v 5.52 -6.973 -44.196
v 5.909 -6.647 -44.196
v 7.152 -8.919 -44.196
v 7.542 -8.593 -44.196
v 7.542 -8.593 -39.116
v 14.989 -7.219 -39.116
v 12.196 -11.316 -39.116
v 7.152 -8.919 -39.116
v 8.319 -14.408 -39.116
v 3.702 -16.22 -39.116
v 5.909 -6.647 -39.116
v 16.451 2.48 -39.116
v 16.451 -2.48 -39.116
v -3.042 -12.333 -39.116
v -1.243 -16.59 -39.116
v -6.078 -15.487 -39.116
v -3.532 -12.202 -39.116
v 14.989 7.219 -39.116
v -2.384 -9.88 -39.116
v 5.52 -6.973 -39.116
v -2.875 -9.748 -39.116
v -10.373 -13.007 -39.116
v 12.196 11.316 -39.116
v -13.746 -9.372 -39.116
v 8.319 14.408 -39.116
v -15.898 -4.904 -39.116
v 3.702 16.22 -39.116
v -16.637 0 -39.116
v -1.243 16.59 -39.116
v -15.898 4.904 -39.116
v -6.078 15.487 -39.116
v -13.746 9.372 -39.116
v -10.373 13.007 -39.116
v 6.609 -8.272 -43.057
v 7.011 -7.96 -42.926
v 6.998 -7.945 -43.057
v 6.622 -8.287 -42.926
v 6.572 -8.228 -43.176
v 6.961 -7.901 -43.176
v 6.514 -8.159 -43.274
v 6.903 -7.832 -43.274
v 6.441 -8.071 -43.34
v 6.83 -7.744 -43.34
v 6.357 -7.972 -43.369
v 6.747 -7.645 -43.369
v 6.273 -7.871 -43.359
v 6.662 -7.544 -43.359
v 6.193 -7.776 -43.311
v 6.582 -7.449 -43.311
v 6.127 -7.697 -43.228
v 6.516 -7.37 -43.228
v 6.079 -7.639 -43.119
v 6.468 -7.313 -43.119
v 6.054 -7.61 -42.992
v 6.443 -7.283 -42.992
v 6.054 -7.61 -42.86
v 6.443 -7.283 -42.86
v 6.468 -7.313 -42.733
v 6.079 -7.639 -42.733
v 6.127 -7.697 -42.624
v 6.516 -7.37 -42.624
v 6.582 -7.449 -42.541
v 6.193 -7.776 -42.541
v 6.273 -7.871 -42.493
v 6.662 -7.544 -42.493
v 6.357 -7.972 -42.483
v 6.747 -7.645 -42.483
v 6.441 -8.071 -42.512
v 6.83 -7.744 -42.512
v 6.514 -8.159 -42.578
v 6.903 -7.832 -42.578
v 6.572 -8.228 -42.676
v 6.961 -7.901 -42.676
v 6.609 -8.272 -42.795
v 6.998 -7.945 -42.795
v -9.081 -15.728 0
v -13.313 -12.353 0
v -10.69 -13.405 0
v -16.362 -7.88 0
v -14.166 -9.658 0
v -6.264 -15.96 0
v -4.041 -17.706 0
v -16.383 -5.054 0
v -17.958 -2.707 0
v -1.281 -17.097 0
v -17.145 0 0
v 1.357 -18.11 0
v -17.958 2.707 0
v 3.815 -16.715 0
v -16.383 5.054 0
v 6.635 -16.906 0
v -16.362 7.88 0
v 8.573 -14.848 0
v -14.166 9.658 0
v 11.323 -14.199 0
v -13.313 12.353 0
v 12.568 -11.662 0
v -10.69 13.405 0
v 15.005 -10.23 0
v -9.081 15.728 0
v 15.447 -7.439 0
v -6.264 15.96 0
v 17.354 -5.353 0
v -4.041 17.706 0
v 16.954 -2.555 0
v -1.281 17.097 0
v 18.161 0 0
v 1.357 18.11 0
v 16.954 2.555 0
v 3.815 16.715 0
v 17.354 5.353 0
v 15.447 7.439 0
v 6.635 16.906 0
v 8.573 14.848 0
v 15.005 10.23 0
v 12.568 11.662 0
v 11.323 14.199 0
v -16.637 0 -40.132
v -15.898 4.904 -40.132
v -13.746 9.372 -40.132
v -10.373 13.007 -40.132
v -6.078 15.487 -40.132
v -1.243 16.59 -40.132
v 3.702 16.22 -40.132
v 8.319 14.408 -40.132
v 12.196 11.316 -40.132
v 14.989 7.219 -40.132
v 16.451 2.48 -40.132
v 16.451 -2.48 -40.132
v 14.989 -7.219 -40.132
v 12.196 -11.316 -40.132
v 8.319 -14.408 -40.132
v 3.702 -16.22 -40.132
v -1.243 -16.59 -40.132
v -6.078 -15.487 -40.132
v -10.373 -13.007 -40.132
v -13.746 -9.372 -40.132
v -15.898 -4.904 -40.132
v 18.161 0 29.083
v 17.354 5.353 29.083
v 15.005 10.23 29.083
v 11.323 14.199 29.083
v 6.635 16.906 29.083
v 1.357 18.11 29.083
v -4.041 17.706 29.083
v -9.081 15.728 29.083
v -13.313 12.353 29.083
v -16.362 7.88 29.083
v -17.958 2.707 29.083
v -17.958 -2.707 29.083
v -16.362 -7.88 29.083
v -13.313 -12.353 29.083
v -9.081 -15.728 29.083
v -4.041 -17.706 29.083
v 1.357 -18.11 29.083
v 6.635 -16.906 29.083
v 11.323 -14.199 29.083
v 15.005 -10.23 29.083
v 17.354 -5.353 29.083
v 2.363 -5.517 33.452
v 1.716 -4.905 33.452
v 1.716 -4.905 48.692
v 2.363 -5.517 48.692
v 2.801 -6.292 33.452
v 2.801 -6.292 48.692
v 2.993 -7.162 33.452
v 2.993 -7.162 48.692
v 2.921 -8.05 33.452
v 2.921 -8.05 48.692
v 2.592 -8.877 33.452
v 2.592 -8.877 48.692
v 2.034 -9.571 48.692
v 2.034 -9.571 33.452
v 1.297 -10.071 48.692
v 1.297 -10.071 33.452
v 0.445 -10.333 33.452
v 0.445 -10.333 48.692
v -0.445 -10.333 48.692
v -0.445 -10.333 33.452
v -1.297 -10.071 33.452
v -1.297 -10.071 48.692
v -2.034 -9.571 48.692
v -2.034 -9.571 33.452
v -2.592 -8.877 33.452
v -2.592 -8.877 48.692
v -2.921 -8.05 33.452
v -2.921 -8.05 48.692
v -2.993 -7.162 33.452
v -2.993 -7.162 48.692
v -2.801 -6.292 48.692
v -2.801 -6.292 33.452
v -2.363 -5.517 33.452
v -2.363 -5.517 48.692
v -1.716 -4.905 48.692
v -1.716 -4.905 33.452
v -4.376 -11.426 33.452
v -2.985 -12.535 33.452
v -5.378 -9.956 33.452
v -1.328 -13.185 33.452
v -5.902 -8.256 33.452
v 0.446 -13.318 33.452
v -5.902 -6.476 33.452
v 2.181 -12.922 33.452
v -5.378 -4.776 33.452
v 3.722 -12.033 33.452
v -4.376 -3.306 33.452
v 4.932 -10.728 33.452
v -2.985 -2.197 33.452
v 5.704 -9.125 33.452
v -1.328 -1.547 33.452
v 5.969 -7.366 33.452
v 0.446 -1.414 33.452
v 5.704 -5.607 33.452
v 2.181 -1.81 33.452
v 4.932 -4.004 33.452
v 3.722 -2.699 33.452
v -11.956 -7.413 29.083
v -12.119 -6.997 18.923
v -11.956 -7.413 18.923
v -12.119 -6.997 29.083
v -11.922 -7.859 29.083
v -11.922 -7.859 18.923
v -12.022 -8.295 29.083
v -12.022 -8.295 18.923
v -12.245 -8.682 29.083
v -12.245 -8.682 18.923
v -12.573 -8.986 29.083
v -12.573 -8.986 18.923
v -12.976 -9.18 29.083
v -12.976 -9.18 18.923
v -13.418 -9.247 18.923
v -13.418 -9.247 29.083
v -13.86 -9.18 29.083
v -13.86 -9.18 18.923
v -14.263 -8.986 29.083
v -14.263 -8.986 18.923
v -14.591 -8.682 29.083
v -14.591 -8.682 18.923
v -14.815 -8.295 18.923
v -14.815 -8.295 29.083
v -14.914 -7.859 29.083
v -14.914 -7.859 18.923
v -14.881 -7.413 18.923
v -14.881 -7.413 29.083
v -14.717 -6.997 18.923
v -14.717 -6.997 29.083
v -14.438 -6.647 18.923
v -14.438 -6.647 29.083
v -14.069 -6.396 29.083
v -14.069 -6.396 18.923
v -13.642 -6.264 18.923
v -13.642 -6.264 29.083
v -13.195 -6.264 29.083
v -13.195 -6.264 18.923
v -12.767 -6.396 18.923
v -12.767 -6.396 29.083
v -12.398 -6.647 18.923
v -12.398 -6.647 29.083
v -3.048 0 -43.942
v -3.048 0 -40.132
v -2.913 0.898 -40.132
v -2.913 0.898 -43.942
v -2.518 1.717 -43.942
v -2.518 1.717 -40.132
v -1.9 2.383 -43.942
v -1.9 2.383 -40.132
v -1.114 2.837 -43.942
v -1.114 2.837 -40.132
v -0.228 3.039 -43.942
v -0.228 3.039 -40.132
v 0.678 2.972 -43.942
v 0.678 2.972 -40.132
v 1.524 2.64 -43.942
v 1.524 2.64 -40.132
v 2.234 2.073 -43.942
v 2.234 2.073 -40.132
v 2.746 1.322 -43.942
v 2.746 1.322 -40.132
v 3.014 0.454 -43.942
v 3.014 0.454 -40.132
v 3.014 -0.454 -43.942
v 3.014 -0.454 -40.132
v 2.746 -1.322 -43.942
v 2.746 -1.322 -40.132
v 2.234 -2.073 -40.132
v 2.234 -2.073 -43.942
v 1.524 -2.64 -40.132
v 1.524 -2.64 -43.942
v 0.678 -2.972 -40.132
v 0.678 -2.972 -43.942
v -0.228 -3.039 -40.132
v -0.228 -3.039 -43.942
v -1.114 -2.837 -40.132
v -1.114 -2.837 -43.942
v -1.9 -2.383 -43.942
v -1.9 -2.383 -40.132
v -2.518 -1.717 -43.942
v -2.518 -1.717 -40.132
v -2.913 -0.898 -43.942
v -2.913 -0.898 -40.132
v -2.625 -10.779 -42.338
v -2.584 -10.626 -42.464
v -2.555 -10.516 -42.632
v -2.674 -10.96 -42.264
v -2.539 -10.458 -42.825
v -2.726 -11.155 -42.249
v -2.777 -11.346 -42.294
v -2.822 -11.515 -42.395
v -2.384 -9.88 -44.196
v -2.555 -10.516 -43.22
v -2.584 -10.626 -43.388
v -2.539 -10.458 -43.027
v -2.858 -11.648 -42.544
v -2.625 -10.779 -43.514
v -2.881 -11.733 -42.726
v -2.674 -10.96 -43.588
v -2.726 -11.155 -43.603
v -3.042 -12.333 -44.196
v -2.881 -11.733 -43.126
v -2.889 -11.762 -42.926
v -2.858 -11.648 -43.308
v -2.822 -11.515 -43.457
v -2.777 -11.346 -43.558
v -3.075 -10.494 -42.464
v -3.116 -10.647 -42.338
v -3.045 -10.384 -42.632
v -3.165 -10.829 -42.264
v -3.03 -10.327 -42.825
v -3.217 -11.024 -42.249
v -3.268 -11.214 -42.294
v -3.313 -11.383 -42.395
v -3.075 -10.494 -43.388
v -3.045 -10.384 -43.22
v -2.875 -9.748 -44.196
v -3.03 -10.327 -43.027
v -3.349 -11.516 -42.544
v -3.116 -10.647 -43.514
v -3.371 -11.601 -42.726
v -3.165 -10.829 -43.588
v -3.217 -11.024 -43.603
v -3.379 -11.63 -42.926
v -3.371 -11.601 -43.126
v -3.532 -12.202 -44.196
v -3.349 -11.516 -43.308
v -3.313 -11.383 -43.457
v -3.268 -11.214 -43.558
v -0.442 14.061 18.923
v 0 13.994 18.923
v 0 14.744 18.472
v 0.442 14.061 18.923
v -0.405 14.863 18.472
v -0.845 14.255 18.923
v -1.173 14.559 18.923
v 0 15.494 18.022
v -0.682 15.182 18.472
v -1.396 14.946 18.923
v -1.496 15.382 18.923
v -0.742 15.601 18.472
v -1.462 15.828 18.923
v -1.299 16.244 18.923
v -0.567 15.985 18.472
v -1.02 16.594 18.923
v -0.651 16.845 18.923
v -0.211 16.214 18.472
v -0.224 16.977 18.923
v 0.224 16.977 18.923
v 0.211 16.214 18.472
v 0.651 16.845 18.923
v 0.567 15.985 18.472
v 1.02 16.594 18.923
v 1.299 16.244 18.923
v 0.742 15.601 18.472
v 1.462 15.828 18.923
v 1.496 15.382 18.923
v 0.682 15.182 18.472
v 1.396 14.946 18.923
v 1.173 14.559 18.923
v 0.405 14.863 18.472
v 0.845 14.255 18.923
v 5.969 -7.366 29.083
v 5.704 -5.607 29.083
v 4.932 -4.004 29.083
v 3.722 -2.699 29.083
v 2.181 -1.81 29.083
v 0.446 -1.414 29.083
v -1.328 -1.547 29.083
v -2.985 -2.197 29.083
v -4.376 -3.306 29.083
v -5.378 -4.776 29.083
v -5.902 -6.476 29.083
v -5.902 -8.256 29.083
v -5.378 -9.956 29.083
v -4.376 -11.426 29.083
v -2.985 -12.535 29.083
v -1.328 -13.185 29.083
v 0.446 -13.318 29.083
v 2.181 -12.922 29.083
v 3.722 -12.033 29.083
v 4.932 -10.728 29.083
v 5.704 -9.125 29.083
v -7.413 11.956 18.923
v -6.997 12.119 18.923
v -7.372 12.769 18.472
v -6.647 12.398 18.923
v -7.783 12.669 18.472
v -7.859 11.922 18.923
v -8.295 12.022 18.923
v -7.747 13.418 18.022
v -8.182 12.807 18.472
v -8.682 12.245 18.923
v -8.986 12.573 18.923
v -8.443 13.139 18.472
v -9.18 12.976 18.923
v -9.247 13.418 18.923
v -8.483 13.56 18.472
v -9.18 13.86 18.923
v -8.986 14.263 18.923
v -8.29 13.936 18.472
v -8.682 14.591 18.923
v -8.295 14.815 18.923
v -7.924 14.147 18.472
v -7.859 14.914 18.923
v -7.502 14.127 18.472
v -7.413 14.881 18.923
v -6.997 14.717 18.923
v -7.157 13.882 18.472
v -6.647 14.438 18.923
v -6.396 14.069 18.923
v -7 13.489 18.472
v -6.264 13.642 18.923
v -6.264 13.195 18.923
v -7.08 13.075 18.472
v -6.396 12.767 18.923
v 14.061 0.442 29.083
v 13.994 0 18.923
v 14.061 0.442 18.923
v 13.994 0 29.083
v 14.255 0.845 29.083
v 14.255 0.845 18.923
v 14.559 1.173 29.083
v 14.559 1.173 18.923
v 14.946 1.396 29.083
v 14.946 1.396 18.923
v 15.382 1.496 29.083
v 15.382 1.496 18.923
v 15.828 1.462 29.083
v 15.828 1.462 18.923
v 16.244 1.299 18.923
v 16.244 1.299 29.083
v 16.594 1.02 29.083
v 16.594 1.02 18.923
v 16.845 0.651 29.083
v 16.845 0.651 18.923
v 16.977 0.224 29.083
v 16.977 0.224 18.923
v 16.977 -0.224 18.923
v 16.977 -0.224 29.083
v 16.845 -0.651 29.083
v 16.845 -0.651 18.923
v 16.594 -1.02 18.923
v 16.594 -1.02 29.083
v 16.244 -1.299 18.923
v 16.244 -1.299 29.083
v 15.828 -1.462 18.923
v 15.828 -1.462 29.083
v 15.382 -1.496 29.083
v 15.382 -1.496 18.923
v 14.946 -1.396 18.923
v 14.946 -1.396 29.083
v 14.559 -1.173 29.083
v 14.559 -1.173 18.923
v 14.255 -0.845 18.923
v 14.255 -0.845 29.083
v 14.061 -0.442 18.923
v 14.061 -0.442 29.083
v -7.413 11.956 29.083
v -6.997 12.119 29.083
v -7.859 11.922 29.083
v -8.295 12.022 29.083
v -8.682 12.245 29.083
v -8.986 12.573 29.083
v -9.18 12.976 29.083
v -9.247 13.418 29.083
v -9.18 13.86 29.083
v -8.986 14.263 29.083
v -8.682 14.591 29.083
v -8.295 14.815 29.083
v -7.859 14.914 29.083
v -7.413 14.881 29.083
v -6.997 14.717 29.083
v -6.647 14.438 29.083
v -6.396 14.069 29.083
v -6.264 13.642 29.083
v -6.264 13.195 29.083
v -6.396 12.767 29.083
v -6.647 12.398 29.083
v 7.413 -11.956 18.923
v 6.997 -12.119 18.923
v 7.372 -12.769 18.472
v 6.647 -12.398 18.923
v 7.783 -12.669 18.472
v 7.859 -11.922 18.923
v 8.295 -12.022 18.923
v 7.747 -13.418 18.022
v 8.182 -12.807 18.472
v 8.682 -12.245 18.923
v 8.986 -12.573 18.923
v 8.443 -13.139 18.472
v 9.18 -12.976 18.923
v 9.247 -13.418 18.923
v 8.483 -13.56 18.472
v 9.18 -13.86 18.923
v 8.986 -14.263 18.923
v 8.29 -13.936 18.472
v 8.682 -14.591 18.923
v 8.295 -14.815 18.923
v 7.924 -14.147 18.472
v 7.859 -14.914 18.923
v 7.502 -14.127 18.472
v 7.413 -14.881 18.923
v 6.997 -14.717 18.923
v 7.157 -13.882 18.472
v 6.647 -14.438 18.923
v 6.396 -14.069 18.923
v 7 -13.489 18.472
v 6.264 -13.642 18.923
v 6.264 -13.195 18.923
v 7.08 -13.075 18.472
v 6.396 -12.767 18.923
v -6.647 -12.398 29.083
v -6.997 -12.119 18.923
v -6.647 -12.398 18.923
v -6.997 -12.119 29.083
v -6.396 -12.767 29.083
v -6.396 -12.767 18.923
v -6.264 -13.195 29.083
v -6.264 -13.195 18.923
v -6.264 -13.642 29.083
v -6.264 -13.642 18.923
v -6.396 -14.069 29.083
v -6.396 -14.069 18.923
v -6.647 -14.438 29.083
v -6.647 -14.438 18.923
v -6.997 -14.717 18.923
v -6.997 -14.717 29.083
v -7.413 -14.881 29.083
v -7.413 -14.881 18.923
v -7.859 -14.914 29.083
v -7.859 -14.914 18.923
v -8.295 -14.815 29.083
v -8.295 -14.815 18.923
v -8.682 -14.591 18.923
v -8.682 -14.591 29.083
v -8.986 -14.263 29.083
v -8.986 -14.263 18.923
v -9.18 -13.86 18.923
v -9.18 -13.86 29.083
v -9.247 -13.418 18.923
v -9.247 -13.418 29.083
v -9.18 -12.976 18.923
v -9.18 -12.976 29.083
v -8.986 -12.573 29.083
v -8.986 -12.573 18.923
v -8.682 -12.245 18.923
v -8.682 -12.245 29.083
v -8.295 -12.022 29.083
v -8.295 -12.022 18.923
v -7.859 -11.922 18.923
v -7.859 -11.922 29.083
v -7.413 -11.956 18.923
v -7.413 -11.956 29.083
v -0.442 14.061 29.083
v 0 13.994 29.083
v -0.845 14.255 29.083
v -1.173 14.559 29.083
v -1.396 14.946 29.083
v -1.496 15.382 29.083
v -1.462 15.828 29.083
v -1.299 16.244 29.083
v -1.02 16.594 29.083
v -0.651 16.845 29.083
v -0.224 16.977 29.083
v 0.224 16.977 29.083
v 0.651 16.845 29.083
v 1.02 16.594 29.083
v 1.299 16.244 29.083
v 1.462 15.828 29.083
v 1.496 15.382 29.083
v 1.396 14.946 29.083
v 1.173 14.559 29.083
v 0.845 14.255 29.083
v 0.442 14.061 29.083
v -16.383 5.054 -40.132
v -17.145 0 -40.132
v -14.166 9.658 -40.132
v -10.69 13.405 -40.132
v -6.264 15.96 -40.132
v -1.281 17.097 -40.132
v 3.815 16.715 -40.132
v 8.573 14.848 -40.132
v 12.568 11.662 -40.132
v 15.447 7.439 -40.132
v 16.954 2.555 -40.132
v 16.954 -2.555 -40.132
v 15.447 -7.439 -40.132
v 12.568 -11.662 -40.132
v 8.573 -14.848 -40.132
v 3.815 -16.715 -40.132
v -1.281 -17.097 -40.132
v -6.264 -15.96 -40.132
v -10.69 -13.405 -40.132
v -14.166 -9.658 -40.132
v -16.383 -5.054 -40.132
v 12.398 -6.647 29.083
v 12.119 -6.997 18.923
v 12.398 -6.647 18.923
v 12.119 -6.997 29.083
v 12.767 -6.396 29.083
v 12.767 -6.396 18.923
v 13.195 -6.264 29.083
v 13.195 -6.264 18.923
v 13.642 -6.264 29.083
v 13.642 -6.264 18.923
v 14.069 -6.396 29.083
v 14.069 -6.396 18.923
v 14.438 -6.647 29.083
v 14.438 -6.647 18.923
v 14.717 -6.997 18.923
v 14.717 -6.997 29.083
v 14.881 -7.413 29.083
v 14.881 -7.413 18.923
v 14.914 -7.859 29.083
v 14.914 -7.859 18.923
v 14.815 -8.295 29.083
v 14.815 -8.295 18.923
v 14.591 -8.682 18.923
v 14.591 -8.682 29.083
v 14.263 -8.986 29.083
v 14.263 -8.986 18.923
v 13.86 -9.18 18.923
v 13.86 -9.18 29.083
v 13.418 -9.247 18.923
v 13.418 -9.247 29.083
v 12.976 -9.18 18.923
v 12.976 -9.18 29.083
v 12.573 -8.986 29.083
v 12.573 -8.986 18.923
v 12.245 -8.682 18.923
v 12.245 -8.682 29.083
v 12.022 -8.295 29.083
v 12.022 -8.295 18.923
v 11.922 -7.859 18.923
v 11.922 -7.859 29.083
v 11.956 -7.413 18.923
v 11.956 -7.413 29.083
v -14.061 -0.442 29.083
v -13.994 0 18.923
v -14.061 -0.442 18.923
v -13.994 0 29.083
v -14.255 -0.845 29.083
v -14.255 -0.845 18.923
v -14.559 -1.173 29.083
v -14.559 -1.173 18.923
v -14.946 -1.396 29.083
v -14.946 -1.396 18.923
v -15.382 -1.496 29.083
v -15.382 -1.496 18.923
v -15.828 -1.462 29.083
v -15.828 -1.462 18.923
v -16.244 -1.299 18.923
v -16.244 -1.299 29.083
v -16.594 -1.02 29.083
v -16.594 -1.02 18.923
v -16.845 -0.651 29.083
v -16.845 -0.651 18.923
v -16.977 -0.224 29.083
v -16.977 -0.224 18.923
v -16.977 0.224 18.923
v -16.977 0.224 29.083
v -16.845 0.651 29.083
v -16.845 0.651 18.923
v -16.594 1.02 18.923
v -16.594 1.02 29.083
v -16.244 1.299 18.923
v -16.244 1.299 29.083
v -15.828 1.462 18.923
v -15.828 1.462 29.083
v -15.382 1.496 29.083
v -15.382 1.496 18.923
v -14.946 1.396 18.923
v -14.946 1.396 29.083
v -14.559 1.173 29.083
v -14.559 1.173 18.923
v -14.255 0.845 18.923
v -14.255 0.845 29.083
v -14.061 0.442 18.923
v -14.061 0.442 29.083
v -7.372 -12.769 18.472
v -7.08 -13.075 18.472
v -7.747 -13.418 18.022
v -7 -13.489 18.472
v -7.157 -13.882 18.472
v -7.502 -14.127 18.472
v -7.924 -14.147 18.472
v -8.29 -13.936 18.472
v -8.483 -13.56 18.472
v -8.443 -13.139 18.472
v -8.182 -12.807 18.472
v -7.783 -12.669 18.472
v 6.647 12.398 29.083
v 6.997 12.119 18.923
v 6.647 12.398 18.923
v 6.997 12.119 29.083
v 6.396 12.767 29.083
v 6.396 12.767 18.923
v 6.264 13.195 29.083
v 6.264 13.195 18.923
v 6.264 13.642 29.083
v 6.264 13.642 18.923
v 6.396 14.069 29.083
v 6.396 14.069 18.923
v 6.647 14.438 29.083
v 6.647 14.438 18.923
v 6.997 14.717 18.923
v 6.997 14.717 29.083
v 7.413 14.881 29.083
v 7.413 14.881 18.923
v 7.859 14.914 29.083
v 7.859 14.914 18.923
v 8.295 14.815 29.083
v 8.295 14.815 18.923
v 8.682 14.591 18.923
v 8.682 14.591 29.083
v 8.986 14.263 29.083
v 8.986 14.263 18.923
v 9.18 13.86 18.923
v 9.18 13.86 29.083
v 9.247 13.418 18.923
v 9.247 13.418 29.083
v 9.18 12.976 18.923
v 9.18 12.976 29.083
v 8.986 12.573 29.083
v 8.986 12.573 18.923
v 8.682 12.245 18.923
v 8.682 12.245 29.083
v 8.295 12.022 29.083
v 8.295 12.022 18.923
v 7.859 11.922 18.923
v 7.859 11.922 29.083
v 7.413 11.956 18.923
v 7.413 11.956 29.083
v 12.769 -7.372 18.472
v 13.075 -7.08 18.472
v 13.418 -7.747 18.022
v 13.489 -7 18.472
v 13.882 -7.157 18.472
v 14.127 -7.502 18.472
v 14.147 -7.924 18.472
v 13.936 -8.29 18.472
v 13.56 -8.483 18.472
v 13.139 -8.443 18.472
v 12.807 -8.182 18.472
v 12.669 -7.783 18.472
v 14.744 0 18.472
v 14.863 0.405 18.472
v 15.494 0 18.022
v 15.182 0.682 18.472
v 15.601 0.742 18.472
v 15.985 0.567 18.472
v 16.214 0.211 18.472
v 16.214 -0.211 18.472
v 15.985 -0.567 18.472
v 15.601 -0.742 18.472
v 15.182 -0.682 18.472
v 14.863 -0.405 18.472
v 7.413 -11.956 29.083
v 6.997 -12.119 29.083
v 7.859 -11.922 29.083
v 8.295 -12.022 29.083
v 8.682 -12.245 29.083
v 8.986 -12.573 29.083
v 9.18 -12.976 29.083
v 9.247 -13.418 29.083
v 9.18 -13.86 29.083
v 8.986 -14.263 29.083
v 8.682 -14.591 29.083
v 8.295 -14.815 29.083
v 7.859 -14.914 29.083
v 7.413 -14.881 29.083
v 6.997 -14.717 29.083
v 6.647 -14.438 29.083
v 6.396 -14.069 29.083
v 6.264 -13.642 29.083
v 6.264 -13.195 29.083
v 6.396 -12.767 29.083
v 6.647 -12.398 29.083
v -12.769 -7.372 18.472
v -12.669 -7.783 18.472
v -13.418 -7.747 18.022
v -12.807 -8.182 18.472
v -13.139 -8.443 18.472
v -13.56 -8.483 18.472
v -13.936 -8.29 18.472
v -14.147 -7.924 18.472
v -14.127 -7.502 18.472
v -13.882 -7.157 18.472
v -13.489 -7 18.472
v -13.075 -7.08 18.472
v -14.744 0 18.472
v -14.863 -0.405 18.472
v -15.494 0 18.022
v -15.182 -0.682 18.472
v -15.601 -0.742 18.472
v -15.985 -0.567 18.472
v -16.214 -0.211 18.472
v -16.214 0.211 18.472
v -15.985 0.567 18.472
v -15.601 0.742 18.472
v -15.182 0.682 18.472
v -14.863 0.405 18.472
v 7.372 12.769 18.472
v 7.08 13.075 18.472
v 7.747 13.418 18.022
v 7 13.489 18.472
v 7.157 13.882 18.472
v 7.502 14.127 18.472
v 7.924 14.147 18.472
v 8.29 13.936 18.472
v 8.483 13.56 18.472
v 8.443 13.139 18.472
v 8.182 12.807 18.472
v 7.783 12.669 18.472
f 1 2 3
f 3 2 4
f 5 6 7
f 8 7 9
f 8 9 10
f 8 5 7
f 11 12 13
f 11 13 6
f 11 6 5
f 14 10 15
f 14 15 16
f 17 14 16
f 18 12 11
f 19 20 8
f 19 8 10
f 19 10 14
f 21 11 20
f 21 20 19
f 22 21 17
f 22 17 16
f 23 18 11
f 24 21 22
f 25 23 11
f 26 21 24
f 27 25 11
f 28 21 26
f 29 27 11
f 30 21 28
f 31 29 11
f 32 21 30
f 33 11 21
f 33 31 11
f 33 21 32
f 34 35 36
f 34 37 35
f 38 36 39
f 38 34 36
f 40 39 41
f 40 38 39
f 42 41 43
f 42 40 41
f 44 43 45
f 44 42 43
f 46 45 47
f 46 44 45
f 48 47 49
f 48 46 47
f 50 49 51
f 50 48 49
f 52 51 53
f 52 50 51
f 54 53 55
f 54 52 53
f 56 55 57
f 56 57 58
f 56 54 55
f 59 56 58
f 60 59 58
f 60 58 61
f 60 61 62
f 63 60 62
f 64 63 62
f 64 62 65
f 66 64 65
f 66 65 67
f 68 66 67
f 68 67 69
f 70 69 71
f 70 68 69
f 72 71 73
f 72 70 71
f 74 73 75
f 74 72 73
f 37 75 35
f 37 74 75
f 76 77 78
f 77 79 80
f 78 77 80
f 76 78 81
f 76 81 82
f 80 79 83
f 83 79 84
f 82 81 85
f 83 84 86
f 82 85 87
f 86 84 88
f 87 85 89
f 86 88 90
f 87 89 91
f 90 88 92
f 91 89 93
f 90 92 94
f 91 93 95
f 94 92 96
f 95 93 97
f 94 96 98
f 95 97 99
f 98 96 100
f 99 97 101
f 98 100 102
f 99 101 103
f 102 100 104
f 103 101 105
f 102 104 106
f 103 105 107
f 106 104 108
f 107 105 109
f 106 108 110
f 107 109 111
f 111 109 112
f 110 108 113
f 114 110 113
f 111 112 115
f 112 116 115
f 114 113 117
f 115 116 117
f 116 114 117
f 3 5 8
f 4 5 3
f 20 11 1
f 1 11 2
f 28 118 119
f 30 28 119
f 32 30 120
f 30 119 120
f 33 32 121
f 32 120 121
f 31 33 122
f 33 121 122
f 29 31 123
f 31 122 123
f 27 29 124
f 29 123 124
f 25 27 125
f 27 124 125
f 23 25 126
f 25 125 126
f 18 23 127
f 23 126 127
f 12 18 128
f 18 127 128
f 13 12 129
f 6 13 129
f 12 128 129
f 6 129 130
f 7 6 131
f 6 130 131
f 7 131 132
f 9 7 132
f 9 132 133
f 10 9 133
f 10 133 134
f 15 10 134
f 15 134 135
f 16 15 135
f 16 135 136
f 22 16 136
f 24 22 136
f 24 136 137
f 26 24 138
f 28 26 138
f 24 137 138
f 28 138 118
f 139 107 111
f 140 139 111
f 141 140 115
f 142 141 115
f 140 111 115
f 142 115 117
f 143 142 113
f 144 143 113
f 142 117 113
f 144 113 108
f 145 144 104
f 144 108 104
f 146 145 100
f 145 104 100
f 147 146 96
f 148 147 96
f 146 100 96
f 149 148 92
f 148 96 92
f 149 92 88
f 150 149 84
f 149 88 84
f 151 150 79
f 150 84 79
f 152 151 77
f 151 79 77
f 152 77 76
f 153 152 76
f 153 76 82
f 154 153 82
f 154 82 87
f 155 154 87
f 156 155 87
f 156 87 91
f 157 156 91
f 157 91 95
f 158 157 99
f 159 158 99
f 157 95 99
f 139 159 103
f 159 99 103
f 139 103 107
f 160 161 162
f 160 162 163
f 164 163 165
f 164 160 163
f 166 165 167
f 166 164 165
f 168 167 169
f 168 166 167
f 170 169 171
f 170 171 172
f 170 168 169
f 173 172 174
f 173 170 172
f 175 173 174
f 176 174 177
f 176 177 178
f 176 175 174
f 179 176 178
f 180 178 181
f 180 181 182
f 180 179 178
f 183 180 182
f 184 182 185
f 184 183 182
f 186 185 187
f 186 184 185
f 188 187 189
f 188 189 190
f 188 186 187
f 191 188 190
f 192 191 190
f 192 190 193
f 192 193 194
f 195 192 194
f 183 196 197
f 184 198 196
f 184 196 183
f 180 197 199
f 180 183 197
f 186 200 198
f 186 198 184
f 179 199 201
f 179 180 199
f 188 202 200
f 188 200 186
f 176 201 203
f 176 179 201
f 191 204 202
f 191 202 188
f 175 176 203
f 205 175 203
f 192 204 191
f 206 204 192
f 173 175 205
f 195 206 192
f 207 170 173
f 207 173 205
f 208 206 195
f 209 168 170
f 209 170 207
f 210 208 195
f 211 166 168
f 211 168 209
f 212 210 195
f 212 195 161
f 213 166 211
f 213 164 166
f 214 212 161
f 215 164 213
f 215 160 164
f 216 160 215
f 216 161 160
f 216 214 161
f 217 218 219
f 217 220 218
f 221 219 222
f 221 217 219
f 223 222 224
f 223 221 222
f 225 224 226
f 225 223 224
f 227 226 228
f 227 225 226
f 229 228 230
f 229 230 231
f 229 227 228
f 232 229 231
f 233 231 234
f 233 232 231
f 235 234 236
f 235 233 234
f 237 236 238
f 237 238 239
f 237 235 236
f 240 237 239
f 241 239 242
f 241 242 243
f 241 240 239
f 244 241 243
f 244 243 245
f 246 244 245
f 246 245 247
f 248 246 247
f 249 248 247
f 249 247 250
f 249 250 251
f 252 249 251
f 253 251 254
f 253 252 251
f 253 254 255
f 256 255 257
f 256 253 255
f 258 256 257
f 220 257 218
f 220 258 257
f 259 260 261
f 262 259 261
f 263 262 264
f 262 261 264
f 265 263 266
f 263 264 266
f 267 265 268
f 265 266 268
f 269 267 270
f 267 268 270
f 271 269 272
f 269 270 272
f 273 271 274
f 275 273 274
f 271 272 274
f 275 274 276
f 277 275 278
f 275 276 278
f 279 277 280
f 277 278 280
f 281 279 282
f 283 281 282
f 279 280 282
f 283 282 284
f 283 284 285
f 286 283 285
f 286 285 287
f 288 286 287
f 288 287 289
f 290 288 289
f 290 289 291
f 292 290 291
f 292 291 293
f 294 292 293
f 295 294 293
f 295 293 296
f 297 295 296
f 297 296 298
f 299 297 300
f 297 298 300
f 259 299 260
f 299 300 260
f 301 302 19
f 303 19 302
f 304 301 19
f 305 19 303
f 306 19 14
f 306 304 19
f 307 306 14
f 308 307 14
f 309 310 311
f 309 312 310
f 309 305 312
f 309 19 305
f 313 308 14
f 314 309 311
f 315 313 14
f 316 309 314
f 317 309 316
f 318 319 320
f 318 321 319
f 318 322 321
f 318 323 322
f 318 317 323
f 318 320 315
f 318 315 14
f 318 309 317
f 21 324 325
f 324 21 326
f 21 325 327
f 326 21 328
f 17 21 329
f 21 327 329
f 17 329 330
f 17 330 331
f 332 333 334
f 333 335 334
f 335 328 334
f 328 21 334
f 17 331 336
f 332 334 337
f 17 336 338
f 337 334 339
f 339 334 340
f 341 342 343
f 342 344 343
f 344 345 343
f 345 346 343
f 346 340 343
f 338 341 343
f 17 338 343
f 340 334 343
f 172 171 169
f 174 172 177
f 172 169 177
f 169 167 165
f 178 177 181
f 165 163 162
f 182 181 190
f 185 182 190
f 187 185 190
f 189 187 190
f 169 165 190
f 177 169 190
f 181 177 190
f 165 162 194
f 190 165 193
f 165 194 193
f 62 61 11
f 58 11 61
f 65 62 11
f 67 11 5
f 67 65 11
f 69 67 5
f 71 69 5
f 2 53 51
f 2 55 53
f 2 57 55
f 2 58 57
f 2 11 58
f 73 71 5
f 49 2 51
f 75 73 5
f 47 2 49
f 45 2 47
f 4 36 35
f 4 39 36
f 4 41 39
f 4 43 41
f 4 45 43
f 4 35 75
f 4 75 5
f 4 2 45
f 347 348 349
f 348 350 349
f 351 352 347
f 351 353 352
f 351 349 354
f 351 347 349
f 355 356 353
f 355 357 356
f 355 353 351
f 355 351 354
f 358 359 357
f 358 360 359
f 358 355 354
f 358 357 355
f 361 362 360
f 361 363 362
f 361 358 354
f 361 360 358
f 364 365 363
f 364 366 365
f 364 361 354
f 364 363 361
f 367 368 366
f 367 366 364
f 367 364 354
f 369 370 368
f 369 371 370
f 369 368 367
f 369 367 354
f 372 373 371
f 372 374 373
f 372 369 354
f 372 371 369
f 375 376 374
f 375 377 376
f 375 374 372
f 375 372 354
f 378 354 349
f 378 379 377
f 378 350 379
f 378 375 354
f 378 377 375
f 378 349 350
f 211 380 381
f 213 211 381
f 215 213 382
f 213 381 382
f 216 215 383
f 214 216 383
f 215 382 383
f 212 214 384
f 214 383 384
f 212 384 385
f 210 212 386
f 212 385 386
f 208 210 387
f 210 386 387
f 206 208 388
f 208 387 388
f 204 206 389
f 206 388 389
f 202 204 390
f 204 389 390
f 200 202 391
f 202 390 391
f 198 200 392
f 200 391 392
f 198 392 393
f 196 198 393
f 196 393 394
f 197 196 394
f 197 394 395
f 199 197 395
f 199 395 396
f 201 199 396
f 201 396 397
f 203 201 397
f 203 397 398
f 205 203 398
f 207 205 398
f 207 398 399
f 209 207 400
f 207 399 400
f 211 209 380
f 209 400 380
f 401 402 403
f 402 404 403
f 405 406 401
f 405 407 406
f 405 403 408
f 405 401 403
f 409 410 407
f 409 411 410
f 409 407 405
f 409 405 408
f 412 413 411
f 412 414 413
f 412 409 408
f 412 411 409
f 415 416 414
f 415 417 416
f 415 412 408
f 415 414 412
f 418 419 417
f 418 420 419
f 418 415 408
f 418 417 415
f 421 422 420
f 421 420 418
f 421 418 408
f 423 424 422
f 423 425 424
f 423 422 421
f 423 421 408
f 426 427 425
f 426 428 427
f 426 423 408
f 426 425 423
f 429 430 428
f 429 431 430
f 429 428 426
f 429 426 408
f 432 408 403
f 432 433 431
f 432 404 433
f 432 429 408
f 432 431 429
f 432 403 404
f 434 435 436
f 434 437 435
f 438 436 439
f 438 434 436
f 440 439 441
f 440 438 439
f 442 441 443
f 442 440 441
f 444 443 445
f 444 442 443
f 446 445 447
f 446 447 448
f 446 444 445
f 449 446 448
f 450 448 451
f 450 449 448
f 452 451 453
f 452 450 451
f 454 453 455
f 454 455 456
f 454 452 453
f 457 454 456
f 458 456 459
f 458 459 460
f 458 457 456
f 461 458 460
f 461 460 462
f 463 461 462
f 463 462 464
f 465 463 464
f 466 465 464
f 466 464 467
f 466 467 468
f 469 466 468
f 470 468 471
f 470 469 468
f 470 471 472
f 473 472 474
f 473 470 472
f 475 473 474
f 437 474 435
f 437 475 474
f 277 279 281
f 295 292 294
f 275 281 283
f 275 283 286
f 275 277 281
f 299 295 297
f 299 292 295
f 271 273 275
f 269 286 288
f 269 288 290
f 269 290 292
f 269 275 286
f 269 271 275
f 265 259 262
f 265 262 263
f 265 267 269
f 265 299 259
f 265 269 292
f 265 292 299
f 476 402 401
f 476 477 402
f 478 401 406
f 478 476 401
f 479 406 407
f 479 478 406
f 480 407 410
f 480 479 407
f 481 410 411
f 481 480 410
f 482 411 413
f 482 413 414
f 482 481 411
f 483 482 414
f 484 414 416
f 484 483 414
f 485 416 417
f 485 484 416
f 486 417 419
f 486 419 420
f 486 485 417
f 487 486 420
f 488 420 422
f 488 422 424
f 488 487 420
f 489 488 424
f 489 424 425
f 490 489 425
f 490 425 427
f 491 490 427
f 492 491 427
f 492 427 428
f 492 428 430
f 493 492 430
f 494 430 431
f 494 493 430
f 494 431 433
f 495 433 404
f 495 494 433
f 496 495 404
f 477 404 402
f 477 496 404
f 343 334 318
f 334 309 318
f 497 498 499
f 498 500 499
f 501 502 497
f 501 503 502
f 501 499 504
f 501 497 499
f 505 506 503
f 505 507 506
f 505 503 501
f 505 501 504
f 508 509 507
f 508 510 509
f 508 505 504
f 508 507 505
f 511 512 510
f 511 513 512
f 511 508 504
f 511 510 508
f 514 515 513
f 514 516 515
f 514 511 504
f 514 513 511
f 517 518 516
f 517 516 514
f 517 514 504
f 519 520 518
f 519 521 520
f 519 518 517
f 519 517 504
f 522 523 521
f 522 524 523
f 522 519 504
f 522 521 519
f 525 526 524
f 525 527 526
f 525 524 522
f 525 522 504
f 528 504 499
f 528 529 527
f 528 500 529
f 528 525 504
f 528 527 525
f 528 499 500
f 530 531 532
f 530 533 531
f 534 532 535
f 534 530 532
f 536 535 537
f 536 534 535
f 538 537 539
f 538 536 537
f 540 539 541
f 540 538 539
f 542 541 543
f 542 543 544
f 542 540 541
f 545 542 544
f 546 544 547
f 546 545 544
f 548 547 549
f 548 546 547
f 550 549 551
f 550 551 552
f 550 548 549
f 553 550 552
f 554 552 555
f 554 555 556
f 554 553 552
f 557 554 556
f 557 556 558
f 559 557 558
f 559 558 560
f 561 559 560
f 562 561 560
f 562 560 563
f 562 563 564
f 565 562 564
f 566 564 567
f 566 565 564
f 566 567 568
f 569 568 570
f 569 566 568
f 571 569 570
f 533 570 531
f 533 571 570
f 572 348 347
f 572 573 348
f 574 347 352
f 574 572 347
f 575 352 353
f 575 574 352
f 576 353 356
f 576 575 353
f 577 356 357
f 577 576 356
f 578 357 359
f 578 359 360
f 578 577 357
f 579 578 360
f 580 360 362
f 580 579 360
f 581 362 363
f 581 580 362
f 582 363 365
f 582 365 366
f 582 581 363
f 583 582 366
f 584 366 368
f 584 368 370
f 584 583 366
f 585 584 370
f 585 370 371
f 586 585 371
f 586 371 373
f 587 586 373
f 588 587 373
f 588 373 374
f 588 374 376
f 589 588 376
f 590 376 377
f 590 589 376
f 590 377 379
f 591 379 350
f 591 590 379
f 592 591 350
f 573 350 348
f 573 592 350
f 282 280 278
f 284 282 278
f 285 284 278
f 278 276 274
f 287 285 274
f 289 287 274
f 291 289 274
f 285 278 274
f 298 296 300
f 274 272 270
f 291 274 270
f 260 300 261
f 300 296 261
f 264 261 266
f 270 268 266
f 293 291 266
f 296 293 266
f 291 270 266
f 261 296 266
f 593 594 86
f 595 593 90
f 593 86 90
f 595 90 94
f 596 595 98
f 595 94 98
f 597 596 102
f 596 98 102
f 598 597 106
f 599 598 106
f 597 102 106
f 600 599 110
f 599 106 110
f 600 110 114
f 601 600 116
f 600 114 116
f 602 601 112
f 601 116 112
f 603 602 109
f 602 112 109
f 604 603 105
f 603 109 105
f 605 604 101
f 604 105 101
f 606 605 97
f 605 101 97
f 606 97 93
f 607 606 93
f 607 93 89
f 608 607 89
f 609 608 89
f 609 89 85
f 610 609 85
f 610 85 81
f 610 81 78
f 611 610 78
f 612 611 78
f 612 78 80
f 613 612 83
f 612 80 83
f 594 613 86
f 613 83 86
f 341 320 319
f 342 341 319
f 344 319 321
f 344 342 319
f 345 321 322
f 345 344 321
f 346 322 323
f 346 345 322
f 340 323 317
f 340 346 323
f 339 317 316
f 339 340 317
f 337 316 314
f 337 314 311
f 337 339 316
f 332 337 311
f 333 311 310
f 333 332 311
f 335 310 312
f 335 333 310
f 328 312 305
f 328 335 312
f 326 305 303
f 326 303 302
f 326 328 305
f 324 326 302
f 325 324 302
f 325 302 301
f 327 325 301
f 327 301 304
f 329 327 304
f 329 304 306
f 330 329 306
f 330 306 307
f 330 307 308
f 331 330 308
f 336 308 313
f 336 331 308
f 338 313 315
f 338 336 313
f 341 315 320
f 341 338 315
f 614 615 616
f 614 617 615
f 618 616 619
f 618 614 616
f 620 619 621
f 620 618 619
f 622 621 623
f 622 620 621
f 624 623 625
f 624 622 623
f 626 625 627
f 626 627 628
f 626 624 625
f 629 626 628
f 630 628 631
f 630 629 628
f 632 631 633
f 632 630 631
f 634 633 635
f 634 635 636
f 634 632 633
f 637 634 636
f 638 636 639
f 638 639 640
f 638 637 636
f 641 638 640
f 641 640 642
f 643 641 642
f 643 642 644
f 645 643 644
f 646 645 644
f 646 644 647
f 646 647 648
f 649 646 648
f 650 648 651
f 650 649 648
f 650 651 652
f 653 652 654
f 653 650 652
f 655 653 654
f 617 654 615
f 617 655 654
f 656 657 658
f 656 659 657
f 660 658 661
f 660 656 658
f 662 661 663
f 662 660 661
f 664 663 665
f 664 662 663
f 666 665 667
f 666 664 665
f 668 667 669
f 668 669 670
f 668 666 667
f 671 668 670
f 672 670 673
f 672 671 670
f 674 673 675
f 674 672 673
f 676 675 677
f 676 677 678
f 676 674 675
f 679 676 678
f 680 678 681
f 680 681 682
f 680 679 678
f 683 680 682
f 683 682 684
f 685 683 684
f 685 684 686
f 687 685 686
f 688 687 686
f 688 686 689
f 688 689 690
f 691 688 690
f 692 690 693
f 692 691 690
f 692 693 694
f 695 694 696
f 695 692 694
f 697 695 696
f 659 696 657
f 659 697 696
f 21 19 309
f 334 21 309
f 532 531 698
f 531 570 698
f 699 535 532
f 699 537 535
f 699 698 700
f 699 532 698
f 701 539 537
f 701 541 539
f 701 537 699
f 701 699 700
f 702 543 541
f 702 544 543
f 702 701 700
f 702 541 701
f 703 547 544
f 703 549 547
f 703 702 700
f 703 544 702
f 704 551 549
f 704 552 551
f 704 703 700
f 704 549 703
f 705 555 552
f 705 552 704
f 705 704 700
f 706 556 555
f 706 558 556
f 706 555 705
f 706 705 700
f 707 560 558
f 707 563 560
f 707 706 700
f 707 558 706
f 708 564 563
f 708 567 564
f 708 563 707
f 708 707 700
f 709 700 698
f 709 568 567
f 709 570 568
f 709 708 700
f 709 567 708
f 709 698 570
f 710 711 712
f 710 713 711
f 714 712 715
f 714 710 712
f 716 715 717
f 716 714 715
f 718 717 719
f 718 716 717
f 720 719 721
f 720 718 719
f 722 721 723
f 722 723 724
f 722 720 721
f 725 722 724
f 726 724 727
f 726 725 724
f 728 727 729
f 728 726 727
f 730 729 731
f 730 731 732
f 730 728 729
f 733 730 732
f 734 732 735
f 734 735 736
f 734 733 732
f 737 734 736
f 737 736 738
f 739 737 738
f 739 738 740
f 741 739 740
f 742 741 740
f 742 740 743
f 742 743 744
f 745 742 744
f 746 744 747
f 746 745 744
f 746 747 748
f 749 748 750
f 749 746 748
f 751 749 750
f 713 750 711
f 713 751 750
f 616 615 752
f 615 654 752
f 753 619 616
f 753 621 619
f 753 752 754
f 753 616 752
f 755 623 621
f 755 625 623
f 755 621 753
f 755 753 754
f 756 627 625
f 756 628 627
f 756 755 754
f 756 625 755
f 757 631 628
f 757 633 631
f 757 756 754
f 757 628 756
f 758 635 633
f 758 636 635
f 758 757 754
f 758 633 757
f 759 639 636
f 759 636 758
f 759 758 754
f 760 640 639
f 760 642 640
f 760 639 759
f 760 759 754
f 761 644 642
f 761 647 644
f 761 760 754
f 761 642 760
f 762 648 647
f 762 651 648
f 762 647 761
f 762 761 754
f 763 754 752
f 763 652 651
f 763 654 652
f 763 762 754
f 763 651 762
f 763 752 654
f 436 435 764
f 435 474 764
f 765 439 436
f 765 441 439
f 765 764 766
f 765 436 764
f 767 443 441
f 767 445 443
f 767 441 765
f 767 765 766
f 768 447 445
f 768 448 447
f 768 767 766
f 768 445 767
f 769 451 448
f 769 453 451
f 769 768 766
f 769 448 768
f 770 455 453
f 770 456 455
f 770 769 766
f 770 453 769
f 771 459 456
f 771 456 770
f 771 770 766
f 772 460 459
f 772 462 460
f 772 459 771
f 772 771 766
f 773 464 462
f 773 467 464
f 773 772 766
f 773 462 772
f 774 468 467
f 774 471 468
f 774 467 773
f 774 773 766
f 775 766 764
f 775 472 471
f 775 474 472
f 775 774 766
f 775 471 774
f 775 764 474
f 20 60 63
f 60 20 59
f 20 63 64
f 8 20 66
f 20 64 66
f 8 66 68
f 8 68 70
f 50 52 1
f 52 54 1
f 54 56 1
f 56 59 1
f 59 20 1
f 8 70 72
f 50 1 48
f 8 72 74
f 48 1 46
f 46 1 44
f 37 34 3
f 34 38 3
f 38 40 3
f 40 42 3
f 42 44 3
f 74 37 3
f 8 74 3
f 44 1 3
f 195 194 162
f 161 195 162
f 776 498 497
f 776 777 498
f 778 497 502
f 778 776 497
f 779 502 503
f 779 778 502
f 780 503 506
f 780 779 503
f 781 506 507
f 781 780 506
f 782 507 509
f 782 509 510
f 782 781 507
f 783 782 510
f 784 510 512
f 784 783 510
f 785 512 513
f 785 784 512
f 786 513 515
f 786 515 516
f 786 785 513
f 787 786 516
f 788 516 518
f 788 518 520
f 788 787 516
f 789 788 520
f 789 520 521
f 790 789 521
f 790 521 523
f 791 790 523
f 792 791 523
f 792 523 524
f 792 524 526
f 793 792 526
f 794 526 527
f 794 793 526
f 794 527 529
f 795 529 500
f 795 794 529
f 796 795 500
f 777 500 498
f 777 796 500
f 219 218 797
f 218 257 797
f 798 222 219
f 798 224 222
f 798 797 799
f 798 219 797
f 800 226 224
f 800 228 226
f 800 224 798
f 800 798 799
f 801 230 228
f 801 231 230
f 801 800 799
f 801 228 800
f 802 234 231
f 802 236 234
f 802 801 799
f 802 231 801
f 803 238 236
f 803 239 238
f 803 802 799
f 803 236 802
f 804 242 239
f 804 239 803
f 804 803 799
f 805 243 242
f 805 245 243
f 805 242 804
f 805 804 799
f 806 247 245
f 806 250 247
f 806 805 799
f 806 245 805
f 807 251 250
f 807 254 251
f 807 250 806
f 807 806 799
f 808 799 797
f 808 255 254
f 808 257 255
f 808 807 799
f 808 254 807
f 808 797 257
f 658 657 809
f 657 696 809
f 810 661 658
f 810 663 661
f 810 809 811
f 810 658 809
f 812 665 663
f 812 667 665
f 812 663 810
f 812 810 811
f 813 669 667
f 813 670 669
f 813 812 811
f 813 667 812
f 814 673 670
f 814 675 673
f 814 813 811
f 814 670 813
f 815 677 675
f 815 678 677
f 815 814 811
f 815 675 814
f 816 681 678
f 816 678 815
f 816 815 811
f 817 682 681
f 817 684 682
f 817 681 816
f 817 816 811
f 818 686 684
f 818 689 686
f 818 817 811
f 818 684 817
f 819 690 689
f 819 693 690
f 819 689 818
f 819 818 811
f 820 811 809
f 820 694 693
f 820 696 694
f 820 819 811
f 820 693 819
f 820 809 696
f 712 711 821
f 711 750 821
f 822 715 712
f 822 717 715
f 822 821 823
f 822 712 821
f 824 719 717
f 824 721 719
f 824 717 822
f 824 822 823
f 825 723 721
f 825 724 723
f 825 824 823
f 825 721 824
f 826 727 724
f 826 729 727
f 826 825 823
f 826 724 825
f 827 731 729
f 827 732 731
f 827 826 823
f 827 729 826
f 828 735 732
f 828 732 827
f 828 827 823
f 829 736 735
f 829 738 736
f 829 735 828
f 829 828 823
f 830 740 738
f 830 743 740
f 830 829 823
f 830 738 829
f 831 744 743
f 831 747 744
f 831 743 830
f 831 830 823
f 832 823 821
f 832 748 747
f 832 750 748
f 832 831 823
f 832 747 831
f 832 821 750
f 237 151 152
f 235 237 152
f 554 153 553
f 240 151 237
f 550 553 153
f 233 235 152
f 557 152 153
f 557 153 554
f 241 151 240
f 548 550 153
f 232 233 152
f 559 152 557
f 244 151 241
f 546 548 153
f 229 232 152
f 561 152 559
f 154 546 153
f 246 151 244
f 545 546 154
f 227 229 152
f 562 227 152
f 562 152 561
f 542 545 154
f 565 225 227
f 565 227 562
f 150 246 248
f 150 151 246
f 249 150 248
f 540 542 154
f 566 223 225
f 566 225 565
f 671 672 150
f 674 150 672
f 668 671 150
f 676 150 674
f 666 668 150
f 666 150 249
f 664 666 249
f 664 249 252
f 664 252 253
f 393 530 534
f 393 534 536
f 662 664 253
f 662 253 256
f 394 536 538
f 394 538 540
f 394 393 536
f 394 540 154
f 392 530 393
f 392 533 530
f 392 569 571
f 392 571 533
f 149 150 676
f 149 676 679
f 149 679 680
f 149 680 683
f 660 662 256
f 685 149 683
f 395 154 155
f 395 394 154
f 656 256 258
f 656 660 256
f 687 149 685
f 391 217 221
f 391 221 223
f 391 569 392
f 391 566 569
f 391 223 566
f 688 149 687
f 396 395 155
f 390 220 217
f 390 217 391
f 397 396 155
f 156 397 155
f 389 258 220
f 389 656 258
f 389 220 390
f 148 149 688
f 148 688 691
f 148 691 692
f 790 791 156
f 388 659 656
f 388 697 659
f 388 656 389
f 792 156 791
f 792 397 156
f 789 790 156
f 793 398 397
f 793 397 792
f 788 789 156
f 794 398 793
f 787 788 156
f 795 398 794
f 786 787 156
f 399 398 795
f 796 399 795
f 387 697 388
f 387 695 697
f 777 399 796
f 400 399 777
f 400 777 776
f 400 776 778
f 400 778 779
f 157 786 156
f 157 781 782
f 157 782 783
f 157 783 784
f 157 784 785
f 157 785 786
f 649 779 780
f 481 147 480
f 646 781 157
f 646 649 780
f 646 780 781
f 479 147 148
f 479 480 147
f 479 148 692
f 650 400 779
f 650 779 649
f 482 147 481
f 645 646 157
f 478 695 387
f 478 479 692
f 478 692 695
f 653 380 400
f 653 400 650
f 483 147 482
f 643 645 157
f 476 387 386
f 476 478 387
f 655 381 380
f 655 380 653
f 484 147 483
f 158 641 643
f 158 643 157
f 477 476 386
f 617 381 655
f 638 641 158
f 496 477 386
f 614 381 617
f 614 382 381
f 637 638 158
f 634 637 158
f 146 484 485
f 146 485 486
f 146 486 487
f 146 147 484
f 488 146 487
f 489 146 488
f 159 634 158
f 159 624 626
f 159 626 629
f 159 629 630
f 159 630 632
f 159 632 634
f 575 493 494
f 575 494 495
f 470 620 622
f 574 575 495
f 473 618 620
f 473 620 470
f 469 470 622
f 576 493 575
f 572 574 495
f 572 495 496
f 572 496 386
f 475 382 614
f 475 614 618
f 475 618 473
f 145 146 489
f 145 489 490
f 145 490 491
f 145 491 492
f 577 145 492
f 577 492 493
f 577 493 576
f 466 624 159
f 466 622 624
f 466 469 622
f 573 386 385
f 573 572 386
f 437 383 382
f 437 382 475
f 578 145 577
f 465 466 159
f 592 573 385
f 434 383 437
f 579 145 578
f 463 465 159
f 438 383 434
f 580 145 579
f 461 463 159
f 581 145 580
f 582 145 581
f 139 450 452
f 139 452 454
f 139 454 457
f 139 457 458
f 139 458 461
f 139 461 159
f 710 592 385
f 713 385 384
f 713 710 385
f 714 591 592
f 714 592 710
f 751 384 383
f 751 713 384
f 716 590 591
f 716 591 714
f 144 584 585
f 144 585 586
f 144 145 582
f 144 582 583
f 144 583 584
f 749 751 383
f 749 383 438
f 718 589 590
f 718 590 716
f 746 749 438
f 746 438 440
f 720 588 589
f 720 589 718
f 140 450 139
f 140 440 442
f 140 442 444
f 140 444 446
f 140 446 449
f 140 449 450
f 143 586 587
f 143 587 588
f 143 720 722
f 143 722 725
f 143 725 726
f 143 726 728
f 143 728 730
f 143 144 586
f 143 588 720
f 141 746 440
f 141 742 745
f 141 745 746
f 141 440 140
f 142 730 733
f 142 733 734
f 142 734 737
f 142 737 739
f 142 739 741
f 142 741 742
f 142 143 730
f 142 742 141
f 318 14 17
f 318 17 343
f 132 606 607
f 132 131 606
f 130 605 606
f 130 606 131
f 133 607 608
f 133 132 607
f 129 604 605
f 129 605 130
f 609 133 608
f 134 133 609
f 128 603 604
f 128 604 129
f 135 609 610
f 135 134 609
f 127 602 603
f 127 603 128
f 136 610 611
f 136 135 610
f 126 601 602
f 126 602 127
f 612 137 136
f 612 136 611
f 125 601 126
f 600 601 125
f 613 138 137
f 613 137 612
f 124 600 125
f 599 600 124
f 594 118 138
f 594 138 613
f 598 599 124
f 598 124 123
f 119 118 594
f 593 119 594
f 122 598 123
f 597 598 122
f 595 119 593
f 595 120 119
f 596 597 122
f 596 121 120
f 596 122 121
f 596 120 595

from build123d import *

# Parameters (mm, degrees)
SKETCH1_R           = 18.161
BOSS_EXTRUDE1_DEPTH = 29.083
SKETCH5_R           = 5.969
BOSS_EXTRUDE5_DEPTH = 4.3688
BOSS_EXTRUDE6_DEPTH = 15.24
CIRPATTERN2_COUNT   = 12
SKETCH2_R           = 17.145
BOSS_EXTRUDE2_DEPTH = 40.132
SKETCH3_R           = 3.048
BOSS_EXTRUDE3_DEPTH = 3.81
SKETCH13_R          = 16.637
CUT_EXTRUDE1_DEPTH  = 1.016
SKETCH15_W          = 2.54
SKETCH15_H          = 5.08
SKETCH15_R          = 0.4445
BOSS_EXTRUDE7_DEPTH = 0.254
SKETCH16_W          = 2.54
SKETCH16_H          = 5.08
SKETCH16_R          = 0.678606607
BOSS_EXTRUDE8_DEPTH = 0.254


with BuildPart() as part:
    # Sketch1 → Boss-Extrude1 (new body)
    with BuildSketch(Plane.XY):
        Circle(SKETCH1_R)
    extrude(amount=BOSS_EXTRUDE1_DEPTH)

    # Sketch5 → Boss-Extrude5 (add)
    with BuildSketch(Plane.XY.offset(29.083)):
        with Locations((0, -7.366)):
            Circle(SKETCH5_R)
    extrude(amount=BOSS_EXTRUDE5_DEPTH)

    # Sketch6 → Boss-Extrude6 (add)
    with BuildSketch(Plane.XY.offset(33.4518)):
        with BuildLine():
            Line((-1.715657017, -4.905), (1.715657017, -4.905))
            ThreePointArc((1.715657017, -4.905), (0, -10.366), (-1.715657017, -4.905))
        make_face()
    extrude(amount=BOSS_EXTRUDE6_DEPTH)

    # Sketch12 → Ø3.0mm Dowel Hole1 (revolve, cut)
    with BuildSketch(Plane(origin=(0, 15.494, 29.083), x_dir=(0, -1, 0), z_dir=(1, 0, 0))):
        Polygon((0, 0), (0, 11.061290929), (1.5, 10.16), (1.5, 0), align=None)
    f_3_0mm_dowel_hole1 = revolve(axis=Axis((0, 15.494, 35.433), (0, 0, -1)), mode=Mode.SUBTRACT)

    # CirPattern2: Ø3.0mm Dowel Hole1 ×12 about axis, 3 skipped
    cirpattern2_axis = Axis((0, 0, 0), (0, 0, -1))
    add([f_3_0mm_dowel_hole1.rotate(cirpattern2_axis, i * 360 / CIRPATTERN2_COUNT) for i in range(1, CIRPATTERN2_COUNT) if i not in (2, 6, 10)], mode=Mode.SUBTRACT)

    # Sketch2 → Boss-Extrude2 (add)
    with BuildSketch(Plane(origin=(0, 0, 0), x_dir=(-1, 0, 0), z_dir=(0, 0, -1))):
        Circle(SKETCH2_R)
    extrude(amount=BOSS_EXTRUDE2_DEPTH)

    # Sketch3 → Boss-Extrude3 (add)
    with BuildSketch(Plane(origin=(0, 0, -40.132), x_dir=(-1, 0, 0), z_dir=(0, 0, -1))):
        Circle(SKETCH3_R)
    extrude(amount=BOSS_EXTRUDE3_DEPTH)

    # Sketch13 → Cut-Extrude1 (cut)
    with BuildSketch(Plane(origin=(0, 0, -40.132), x_dir=(-1, 0, 0), z_dir=(0, 0, -1))):
        Circle(SKETCH13_R)
    extrude(amount=-CUT_EXTRUDE1_DEPTH, mode=Mode.SUBTRACT)

    # Sketch15 → Boss-Extrude7 (add, symmetric)
    with BuildSketch(Plane(origin=(0, 0, 0), x_dir=(0.64278761, -0.766044443, 0), z_dir=(0.766044443, 0.64278761, 0))):
        with Locations((10.16, 41.656)):
            Rectangle(SKETCH15_W, SKETCH15_H)
        with Locations((10.16, 42.926)):
            Circle(SKETCH15_R, mode=Mode.SUBTRACT)
    extrude(amount=BOSS_EXTRUDE7_DEPTH, both=True)

    # Sketch16 → Boss-Extrude8 (add, symmetric)
    with BuildSketch(Plane(origin=(0, 0, 0), x_dir=(-0.258819045, -0.965925826, 0), z_dir=(0.965925826, -0.258819045, 0))):
        with Locations((11.43, 41.656)):
            Rectangle(SKETCH16_W, SKETCH16_H)
        with Locations((11.43, 42.926)):
            Circle(SKETCH16_R, mode=Mode.SUBTRACT)
    extrude(amount=BOSS_EXTRUDE8_DEPTH, both=True)


solid = part.part
